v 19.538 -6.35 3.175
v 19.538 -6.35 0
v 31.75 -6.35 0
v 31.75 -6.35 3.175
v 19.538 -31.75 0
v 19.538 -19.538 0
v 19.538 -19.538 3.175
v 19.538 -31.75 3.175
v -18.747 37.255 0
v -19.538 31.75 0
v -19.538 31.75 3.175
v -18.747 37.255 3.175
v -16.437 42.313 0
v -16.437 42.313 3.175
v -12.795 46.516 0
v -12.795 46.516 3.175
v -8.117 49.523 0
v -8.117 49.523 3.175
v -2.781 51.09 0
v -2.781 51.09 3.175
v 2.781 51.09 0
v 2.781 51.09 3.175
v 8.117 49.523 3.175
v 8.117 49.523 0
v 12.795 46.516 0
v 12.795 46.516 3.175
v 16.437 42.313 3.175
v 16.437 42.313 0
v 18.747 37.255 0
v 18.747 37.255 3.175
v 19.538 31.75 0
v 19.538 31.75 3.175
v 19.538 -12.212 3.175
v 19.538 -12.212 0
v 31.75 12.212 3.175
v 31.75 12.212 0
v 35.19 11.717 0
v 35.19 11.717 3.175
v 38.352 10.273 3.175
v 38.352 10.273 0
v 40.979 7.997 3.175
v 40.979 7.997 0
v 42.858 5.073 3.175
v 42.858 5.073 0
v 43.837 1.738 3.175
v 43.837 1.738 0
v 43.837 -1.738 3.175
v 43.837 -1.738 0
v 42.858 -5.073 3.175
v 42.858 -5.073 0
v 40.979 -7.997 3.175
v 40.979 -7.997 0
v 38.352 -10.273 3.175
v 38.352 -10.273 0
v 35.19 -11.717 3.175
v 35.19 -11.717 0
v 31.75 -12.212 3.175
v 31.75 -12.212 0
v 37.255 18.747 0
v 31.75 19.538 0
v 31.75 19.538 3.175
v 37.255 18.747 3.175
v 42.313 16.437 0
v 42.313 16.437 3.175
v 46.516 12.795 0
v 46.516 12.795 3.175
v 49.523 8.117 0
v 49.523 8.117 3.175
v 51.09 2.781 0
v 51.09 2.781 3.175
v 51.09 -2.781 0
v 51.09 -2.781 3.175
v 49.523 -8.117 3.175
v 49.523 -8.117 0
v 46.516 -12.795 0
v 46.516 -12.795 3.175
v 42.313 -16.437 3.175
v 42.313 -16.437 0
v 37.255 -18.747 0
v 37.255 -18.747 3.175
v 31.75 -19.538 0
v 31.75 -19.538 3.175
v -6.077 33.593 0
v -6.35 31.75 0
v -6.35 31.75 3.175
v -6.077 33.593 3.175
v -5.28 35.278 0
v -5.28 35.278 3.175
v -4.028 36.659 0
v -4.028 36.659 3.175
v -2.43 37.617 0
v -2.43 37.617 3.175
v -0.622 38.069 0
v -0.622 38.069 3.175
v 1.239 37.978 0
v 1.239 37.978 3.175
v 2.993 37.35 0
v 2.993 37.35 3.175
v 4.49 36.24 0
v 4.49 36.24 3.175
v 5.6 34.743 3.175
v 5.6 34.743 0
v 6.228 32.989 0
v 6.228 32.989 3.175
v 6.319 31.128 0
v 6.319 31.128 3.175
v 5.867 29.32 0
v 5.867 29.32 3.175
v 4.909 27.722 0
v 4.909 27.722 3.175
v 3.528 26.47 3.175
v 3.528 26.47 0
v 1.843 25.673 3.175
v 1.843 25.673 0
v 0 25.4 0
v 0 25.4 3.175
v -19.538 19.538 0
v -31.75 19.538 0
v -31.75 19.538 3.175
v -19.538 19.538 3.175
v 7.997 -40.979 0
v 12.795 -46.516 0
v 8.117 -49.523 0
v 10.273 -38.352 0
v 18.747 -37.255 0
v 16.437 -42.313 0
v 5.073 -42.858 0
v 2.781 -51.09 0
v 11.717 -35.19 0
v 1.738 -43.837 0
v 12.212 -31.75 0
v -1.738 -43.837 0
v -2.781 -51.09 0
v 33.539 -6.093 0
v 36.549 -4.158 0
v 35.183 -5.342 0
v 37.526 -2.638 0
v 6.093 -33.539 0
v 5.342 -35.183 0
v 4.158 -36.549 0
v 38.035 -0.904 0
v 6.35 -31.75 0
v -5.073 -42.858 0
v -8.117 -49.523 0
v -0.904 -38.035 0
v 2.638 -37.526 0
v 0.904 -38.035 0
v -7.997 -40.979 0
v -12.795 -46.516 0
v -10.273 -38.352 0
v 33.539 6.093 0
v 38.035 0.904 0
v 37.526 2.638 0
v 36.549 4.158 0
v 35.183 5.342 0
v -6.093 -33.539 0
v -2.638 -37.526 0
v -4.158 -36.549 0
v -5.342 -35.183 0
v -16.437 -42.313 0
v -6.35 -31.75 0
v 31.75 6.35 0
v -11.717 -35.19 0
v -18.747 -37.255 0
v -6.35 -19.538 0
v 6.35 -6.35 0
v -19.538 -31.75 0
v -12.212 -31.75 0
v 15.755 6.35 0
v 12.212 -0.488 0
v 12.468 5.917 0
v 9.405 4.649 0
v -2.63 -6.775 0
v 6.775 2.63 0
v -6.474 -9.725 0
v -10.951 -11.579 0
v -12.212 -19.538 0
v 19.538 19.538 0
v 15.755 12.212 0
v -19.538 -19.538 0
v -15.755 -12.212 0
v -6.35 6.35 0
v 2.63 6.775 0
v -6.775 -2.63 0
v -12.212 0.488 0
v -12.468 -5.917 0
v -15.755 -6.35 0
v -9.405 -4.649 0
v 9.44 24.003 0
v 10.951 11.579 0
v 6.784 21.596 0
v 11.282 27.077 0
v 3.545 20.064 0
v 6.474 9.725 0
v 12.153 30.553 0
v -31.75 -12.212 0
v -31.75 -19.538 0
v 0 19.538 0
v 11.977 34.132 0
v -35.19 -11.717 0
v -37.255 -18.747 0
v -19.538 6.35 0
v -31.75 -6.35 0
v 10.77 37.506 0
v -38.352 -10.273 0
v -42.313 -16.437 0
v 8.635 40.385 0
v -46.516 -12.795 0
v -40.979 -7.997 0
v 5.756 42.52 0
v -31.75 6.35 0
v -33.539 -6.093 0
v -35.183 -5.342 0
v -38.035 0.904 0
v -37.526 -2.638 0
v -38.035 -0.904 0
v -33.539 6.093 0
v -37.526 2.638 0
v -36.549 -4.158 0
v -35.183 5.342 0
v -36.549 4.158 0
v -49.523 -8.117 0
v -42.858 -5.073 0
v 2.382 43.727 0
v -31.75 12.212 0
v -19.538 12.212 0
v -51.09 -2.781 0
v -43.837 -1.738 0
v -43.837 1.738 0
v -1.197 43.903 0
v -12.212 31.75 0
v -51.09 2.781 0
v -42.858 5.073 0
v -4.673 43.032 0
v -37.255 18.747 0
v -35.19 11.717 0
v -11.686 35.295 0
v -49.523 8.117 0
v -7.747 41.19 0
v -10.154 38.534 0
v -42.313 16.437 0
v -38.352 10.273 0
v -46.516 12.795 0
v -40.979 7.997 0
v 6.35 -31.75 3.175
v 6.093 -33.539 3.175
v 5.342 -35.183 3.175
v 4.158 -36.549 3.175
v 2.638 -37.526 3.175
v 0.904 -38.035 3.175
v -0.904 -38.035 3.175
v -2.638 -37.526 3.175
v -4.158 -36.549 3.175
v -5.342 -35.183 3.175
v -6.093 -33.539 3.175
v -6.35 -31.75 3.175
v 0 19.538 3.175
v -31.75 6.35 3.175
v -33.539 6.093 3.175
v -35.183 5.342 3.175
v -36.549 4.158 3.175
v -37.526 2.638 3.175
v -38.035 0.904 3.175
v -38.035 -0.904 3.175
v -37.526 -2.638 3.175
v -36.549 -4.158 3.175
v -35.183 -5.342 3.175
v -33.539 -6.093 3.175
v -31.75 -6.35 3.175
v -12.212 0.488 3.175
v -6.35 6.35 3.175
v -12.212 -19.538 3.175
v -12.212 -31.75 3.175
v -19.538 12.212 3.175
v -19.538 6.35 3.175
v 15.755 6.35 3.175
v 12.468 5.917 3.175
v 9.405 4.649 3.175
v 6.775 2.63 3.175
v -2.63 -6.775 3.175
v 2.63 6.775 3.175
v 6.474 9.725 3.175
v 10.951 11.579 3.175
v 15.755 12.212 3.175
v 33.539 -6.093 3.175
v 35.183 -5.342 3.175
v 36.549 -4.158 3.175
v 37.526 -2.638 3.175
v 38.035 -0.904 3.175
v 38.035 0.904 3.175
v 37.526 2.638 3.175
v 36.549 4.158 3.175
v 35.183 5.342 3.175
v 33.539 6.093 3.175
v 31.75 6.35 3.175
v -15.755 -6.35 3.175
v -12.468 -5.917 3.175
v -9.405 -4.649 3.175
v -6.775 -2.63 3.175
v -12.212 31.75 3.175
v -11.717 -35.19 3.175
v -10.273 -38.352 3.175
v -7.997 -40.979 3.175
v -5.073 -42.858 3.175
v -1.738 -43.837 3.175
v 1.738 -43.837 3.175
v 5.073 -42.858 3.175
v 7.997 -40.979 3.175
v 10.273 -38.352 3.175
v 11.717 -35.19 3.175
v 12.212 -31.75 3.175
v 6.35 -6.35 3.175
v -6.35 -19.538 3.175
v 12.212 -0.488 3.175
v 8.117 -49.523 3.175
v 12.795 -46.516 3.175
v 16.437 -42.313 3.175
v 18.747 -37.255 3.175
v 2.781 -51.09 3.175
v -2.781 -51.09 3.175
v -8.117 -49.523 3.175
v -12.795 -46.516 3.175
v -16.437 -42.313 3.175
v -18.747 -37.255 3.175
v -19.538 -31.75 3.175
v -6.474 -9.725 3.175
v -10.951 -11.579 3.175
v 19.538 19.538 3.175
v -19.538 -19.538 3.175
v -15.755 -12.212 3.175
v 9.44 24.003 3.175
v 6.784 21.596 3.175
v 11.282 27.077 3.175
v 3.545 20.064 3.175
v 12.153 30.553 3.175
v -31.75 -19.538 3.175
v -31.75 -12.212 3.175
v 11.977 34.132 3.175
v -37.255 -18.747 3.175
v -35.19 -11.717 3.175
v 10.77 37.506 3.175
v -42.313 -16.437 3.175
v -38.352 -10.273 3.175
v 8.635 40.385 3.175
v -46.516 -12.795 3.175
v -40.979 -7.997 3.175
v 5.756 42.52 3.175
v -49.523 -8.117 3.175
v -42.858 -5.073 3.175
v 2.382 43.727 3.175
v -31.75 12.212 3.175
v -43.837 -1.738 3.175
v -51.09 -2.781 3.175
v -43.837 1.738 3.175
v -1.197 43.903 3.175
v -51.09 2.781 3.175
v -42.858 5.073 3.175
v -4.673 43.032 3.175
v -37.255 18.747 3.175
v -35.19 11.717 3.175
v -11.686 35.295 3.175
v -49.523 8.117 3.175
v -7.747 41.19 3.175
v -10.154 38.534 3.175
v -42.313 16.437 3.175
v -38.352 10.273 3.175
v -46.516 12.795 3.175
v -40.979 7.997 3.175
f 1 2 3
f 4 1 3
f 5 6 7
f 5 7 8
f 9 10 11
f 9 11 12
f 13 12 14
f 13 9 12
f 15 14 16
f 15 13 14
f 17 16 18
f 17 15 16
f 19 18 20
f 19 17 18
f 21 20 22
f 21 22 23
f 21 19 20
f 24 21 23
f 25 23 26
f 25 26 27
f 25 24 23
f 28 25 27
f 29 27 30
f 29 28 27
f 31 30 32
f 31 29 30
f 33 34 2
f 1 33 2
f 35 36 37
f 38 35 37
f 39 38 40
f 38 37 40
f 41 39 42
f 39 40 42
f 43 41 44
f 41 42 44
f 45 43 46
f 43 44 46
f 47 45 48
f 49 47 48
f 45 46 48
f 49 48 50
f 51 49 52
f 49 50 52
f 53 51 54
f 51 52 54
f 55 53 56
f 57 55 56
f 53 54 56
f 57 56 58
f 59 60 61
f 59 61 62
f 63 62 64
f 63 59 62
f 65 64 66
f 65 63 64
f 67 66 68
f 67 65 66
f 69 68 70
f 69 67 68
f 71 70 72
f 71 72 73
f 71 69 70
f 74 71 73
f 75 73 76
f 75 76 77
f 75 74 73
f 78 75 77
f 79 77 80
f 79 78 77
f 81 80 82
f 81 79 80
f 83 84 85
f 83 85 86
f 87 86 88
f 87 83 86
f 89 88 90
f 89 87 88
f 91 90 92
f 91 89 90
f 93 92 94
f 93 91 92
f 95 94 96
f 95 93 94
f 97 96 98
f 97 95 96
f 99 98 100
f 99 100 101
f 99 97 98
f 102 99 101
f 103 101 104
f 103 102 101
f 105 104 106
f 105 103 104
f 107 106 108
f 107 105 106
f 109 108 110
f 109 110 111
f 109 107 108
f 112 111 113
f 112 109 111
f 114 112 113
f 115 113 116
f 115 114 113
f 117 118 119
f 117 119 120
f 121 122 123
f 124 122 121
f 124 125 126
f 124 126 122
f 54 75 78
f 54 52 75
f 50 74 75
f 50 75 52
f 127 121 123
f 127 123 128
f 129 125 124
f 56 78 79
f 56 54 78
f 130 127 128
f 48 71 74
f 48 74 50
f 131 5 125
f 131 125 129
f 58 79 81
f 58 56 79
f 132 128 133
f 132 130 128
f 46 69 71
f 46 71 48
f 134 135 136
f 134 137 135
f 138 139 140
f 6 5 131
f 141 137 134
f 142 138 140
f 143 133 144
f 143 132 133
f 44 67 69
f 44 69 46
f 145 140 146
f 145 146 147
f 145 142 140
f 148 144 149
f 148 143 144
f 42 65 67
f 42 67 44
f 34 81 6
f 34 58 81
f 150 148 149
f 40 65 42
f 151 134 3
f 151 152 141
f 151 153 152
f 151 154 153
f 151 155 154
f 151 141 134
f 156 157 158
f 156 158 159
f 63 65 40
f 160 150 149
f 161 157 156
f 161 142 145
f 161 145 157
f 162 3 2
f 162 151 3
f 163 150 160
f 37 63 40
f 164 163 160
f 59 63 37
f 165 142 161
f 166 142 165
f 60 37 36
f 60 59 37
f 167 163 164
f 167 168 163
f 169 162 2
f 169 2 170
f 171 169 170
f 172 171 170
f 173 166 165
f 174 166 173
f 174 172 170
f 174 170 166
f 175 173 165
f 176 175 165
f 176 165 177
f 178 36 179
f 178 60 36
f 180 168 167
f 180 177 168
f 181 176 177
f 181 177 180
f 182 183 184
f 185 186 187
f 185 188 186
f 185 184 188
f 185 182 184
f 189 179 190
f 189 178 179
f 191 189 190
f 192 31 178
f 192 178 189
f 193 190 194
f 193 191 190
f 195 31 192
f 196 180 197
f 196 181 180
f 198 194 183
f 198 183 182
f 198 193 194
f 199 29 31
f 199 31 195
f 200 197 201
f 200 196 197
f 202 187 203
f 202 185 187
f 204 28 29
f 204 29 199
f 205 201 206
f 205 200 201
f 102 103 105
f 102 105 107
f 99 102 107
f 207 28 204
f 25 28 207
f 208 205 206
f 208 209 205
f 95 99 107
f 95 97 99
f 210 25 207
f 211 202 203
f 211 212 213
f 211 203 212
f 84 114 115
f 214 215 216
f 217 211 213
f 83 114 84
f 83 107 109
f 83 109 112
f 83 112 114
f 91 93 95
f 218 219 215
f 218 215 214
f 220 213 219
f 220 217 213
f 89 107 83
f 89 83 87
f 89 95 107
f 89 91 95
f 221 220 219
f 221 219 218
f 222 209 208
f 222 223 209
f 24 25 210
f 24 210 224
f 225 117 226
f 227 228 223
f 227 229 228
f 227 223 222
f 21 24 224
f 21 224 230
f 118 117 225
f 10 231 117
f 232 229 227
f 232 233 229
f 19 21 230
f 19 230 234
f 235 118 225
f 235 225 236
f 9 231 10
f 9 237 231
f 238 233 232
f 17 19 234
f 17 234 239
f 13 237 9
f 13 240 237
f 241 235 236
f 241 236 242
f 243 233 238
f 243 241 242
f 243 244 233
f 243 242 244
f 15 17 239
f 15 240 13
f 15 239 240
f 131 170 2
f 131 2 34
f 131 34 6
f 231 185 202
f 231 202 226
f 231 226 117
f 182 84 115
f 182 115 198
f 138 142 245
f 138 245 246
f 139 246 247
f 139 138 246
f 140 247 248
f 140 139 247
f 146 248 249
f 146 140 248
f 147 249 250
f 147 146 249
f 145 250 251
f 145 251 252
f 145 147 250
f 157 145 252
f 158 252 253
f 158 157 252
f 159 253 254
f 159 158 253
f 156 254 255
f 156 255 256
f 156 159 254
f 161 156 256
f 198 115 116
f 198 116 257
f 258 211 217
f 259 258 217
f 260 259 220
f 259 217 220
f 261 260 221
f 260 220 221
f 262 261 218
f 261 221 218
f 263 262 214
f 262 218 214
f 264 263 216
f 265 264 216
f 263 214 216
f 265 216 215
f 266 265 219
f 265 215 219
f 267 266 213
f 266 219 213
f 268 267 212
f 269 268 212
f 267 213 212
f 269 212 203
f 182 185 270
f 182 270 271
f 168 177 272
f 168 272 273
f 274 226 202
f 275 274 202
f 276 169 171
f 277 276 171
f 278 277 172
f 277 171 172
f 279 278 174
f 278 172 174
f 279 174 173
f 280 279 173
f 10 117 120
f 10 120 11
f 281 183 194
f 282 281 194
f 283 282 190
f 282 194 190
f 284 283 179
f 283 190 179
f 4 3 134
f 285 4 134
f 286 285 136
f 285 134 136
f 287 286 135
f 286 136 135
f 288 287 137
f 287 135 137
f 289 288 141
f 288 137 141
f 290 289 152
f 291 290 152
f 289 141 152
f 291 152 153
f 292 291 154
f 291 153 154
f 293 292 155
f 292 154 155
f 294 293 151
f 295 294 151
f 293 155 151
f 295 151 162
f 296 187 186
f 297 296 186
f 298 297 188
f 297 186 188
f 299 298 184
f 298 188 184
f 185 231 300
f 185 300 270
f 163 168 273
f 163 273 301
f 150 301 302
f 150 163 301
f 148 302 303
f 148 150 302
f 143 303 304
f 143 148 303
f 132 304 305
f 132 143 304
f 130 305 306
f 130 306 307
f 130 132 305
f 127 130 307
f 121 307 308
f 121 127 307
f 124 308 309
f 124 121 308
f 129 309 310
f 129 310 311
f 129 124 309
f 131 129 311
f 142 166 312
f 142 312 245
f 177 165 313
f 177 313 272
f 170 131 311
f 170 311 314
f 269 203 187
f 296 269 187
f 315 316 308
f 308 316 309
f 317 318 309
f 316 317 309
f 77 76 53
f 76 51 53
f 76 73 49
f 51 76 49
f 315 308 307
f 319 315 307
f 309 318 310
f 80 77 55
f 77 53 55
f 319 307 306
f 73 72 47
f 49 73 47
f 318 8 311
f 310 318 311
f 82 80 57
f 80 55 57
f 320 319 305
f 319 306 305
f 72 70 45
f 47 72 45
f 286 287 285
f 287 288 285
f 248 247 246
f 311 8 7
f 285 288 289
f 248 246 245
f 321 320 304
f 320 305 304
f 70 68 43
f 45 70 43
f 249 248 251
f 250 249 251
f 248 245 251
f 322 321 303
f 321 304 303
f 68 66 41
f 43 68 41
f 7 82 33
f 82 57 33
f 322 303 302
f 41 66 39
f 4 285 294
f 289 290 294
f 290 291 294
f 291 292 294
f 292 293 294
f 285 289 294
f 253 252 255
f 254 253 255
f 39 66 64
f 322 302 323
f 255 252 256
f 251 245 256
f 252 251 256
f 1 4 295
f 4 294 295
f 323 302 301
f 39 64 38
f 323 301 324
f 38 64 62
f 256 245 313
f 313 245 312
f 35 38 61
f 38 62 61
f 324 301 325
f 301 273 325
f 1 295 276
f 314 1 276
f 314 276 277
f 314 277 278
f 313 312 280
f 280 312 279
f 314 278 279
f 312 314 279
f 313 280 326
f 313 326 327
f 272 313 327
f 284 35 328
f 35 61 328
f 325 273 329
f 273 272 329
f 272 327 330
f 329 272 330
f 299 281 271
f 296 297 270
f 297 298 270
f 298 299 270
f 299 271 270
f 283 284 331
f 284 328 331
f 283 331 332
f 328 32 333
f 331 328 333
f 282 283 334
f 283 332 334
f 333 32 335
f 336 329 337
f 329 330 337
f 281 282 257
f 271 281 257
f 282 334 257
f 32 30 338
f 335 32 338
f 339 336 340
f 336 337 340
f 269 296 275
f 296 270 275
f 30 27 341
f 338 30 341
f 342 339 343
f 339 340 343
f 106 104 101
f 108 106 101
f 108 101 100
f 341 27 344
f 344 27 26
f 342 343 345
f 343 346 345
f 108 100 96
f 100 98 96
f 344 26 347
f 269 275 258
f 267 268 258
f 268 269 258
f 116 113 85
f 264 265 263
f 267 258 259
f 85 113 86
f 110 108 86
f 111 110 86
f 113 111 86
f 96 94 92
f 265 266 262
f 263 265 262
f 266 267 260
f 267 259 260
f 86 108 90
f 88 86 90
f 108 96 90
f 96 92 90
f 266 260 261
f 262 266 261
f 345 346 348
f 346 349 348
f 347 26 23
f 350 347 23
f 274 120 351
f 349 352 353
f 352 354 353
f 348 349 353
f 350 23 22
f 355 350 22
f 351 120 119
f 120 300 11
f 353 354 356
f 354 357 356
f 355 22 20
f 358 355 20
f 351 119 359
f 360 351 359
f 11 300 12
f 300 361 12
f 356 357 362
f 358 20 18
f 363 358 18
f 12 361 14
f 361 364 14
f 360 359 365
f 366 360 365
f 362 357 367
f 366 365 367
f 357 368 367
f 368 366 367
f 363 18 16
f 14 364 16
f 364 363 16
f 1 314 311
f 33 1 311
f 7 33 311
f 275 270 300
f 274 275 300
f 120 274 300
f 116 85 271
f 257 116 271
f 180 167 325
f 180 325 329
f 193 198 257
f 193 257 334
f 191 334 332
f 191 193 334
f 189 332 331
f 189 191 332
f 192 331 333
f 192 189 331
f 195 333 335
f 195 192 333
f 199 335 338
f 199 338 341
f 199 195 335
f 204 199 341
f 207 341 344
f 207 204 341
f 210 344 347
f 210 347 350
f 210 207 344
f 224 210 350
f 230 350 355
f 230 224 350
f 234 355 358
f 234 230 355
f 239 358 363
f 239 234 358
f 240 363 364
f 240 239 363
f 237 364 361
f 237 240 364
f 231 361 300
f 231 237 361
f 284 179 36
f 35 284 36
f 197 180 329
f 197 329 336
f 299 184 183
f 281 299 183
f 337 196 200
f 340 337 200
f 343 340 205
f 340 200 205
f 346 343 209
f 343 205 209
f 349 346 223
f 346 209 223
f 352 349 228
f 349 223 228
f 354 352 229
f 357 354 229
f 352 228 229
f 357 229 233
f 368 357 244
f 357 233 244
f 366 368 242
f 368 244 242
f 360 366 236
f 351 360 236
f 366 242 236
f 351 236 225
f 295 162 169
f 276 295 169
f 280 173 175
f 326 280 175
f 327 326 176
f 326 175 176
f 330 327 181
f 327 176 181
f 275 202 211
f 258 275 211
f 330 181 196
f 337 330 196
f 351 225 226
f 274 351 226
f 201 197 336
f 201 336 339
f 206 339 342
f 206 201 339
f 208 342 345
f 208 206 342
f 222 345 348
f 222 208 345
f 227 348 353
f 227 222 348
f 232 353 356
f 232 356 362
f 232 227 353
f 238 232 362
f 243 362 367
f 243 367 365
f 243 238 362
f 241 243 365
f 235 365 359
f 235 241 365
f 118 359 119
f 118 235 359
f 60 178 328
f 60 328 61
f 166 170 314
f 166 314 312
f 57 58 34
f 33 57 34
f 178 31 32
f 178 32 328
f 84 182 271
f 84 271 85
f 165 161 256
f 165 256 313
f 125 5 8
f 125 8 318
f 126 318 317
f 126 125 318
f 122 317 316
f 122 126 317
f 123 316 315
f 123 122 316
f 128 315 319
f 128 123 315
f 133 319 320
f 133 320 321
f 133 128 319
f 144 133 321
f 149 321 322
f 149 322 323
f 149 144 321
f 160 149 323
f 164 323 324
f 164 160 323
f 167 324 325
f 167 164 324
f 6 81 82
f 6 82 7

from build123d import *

# Parameters (mm, degrees)
BOSS_EXTRUDE1_DEPTH = 3.175


with BuildPart() as part:
    # Sketch2 → Boss-Extrude1 (new body)
    with BuildSketch(Plane.XY):
        with BuildLine():
            Line((19.538461538, 19.538461538), (31.75, 19.538461538))
            ThreePointArc((31.75, 19.538461538), (51.288461538, 0), (31.75, -19.538461538))
            Line((31.75, -19.538461538), (19.538461538, -19.538461538))
            Line((19.538461538, -19.538461538), (19.538461538, -31.75))
            ThreePointArc((19.538461538, -31.75), (0, -51.288461538), (-19.538461538, -31.75))
            Line((-19.538461538, -31.75), (-19.538461538, -19.538461538))
            Line((-19.538461538, -19.538461538), (-31.75, -19.538461538))
            ThreePointArc((-31.75, -19.538461538), (-51.288461538, 0), (-31.75, 19.538461538))
            Line((-31.75, 19.538461538), (-19.538461538, 19.538461538))
            Line((-19.538461538, 19.538461538), (-19.538461538, 31.75))
            ThreePointArc((-19.538461538, 31.75), (0, 51.288461538), (19.538461538, 31.75))
            Line((19.538461538, 31.75), (19.538461538, 19.538461538))
        make_face()
        with BuildLine():
            Line((-31.75, 12.211538462), (-19.538461538, 12.211538462))
            Line((-19.538461538, 12.211538462), (-19.538461538, 6.35))
            Line((-19.538461538, 6.35), (-31.75, 6.35))
            ThreePointArc((-31.75, 6.35), (-38.1, 0), (-31.75, -6.35))
            Line((-31.75, -6.35), (-15.755245836, -6.35))
            ThreePointArc((-15.755245836, -6.35), (-10.895166245, -5.383270063), (-6.774989715, -2.630256121))
            Line((-6.774989715, -2.630256121), (2.630256121, 6.774989715))
            ThreePointArc((2.630256121, 6.774989715), (8.652052588, 10.798625477), (15.755245836, 12.211538462))
            Line((15.755245836, 12.211538462), (31.75, 12.211538462))
            ThreePointArc((31.75, 12.211538462), (43.961538462, 0), (31.75, -12.211538462))
            Line((31.75, -12.211538462), (19.538461538, -12.211538462))
            Line((19.538461538, -12.211538462), (19.538461538, -6.35))
            Line((19.538461538, -6.35), (31.75, -6.35))
            ThreePointArc((31.75, -6.35), (38.1, 0), (31.75, 6.35))
            Line((31.75, 6.35), (15.755245836, 6.35))
            ThreePointArc((15.755245836, 6.35), (10.895166245, 5.383270063), (6.774989715, 2.630256121))
            Line((6.774989715, 2.630256121), (-2.630256121, -6.774989715))
            ThreePointArc((-2.630256121, -6.774989715), (-8.652052588, -10.798625477), (-15.755245836, -12.211538462))
            Line((-15.755245836, -12.211538462), (-31.75, -12.211538462))
            ThreePointArc((-31.75, -12.211538462), (-43.961538462, 0), (-31.75, 12.211538462))
        make_face(mode=Mode.SUBTRACT)
        with BuildLine():
            Line((-6.35, -31.75), (-6.35, -19.538461538))
            Line((-6.35, -19.538461538), (-12.211538462, -19.538461538))
            Line((-12.211538462, -19.538461538), (-12.211538462, -31.75))
            ThreePointArc((-12.211538462, -31.75), (0, -43.961538462), (12.211538462, -31.75))
            Line((12.211538462, -31.75), (12.211538462, -0.488461538))
            Line((12.211538462, -0.488461538), (6.35, -6.35))
            Line((6.35, -6.35), (6.35, -31.75))
            ThreePointArc((6.35, -31.75), (0, -38.1), (-6.35, -31.75))
        make_face(mode=Mode.SUBTRACT)
        with BuildLine():
            Line((0, 25.4), (0, 19.538461538))
            ThreePointArc((0, 19.538461538), (8.634861655, 40.384861655), (-12.211538462, 31.75))
            Line((-12.211538462, 31.75), (-12.211538462, 0.488461538))
            Line((-12.211538462, 0.488461538), (-6.35, 6.35))
            Line((-6.35, 6.35), (-6.35, 31.75))
            ThreePointArc((-6.35, 31.75), (4.490128061, 36.240128061), (0, 25.4))
        make_face(mode=Mode.SUBTRACT)
    extrude(amount=BOSS_EXTRUDE1_DEPTH)


solid = part.part
